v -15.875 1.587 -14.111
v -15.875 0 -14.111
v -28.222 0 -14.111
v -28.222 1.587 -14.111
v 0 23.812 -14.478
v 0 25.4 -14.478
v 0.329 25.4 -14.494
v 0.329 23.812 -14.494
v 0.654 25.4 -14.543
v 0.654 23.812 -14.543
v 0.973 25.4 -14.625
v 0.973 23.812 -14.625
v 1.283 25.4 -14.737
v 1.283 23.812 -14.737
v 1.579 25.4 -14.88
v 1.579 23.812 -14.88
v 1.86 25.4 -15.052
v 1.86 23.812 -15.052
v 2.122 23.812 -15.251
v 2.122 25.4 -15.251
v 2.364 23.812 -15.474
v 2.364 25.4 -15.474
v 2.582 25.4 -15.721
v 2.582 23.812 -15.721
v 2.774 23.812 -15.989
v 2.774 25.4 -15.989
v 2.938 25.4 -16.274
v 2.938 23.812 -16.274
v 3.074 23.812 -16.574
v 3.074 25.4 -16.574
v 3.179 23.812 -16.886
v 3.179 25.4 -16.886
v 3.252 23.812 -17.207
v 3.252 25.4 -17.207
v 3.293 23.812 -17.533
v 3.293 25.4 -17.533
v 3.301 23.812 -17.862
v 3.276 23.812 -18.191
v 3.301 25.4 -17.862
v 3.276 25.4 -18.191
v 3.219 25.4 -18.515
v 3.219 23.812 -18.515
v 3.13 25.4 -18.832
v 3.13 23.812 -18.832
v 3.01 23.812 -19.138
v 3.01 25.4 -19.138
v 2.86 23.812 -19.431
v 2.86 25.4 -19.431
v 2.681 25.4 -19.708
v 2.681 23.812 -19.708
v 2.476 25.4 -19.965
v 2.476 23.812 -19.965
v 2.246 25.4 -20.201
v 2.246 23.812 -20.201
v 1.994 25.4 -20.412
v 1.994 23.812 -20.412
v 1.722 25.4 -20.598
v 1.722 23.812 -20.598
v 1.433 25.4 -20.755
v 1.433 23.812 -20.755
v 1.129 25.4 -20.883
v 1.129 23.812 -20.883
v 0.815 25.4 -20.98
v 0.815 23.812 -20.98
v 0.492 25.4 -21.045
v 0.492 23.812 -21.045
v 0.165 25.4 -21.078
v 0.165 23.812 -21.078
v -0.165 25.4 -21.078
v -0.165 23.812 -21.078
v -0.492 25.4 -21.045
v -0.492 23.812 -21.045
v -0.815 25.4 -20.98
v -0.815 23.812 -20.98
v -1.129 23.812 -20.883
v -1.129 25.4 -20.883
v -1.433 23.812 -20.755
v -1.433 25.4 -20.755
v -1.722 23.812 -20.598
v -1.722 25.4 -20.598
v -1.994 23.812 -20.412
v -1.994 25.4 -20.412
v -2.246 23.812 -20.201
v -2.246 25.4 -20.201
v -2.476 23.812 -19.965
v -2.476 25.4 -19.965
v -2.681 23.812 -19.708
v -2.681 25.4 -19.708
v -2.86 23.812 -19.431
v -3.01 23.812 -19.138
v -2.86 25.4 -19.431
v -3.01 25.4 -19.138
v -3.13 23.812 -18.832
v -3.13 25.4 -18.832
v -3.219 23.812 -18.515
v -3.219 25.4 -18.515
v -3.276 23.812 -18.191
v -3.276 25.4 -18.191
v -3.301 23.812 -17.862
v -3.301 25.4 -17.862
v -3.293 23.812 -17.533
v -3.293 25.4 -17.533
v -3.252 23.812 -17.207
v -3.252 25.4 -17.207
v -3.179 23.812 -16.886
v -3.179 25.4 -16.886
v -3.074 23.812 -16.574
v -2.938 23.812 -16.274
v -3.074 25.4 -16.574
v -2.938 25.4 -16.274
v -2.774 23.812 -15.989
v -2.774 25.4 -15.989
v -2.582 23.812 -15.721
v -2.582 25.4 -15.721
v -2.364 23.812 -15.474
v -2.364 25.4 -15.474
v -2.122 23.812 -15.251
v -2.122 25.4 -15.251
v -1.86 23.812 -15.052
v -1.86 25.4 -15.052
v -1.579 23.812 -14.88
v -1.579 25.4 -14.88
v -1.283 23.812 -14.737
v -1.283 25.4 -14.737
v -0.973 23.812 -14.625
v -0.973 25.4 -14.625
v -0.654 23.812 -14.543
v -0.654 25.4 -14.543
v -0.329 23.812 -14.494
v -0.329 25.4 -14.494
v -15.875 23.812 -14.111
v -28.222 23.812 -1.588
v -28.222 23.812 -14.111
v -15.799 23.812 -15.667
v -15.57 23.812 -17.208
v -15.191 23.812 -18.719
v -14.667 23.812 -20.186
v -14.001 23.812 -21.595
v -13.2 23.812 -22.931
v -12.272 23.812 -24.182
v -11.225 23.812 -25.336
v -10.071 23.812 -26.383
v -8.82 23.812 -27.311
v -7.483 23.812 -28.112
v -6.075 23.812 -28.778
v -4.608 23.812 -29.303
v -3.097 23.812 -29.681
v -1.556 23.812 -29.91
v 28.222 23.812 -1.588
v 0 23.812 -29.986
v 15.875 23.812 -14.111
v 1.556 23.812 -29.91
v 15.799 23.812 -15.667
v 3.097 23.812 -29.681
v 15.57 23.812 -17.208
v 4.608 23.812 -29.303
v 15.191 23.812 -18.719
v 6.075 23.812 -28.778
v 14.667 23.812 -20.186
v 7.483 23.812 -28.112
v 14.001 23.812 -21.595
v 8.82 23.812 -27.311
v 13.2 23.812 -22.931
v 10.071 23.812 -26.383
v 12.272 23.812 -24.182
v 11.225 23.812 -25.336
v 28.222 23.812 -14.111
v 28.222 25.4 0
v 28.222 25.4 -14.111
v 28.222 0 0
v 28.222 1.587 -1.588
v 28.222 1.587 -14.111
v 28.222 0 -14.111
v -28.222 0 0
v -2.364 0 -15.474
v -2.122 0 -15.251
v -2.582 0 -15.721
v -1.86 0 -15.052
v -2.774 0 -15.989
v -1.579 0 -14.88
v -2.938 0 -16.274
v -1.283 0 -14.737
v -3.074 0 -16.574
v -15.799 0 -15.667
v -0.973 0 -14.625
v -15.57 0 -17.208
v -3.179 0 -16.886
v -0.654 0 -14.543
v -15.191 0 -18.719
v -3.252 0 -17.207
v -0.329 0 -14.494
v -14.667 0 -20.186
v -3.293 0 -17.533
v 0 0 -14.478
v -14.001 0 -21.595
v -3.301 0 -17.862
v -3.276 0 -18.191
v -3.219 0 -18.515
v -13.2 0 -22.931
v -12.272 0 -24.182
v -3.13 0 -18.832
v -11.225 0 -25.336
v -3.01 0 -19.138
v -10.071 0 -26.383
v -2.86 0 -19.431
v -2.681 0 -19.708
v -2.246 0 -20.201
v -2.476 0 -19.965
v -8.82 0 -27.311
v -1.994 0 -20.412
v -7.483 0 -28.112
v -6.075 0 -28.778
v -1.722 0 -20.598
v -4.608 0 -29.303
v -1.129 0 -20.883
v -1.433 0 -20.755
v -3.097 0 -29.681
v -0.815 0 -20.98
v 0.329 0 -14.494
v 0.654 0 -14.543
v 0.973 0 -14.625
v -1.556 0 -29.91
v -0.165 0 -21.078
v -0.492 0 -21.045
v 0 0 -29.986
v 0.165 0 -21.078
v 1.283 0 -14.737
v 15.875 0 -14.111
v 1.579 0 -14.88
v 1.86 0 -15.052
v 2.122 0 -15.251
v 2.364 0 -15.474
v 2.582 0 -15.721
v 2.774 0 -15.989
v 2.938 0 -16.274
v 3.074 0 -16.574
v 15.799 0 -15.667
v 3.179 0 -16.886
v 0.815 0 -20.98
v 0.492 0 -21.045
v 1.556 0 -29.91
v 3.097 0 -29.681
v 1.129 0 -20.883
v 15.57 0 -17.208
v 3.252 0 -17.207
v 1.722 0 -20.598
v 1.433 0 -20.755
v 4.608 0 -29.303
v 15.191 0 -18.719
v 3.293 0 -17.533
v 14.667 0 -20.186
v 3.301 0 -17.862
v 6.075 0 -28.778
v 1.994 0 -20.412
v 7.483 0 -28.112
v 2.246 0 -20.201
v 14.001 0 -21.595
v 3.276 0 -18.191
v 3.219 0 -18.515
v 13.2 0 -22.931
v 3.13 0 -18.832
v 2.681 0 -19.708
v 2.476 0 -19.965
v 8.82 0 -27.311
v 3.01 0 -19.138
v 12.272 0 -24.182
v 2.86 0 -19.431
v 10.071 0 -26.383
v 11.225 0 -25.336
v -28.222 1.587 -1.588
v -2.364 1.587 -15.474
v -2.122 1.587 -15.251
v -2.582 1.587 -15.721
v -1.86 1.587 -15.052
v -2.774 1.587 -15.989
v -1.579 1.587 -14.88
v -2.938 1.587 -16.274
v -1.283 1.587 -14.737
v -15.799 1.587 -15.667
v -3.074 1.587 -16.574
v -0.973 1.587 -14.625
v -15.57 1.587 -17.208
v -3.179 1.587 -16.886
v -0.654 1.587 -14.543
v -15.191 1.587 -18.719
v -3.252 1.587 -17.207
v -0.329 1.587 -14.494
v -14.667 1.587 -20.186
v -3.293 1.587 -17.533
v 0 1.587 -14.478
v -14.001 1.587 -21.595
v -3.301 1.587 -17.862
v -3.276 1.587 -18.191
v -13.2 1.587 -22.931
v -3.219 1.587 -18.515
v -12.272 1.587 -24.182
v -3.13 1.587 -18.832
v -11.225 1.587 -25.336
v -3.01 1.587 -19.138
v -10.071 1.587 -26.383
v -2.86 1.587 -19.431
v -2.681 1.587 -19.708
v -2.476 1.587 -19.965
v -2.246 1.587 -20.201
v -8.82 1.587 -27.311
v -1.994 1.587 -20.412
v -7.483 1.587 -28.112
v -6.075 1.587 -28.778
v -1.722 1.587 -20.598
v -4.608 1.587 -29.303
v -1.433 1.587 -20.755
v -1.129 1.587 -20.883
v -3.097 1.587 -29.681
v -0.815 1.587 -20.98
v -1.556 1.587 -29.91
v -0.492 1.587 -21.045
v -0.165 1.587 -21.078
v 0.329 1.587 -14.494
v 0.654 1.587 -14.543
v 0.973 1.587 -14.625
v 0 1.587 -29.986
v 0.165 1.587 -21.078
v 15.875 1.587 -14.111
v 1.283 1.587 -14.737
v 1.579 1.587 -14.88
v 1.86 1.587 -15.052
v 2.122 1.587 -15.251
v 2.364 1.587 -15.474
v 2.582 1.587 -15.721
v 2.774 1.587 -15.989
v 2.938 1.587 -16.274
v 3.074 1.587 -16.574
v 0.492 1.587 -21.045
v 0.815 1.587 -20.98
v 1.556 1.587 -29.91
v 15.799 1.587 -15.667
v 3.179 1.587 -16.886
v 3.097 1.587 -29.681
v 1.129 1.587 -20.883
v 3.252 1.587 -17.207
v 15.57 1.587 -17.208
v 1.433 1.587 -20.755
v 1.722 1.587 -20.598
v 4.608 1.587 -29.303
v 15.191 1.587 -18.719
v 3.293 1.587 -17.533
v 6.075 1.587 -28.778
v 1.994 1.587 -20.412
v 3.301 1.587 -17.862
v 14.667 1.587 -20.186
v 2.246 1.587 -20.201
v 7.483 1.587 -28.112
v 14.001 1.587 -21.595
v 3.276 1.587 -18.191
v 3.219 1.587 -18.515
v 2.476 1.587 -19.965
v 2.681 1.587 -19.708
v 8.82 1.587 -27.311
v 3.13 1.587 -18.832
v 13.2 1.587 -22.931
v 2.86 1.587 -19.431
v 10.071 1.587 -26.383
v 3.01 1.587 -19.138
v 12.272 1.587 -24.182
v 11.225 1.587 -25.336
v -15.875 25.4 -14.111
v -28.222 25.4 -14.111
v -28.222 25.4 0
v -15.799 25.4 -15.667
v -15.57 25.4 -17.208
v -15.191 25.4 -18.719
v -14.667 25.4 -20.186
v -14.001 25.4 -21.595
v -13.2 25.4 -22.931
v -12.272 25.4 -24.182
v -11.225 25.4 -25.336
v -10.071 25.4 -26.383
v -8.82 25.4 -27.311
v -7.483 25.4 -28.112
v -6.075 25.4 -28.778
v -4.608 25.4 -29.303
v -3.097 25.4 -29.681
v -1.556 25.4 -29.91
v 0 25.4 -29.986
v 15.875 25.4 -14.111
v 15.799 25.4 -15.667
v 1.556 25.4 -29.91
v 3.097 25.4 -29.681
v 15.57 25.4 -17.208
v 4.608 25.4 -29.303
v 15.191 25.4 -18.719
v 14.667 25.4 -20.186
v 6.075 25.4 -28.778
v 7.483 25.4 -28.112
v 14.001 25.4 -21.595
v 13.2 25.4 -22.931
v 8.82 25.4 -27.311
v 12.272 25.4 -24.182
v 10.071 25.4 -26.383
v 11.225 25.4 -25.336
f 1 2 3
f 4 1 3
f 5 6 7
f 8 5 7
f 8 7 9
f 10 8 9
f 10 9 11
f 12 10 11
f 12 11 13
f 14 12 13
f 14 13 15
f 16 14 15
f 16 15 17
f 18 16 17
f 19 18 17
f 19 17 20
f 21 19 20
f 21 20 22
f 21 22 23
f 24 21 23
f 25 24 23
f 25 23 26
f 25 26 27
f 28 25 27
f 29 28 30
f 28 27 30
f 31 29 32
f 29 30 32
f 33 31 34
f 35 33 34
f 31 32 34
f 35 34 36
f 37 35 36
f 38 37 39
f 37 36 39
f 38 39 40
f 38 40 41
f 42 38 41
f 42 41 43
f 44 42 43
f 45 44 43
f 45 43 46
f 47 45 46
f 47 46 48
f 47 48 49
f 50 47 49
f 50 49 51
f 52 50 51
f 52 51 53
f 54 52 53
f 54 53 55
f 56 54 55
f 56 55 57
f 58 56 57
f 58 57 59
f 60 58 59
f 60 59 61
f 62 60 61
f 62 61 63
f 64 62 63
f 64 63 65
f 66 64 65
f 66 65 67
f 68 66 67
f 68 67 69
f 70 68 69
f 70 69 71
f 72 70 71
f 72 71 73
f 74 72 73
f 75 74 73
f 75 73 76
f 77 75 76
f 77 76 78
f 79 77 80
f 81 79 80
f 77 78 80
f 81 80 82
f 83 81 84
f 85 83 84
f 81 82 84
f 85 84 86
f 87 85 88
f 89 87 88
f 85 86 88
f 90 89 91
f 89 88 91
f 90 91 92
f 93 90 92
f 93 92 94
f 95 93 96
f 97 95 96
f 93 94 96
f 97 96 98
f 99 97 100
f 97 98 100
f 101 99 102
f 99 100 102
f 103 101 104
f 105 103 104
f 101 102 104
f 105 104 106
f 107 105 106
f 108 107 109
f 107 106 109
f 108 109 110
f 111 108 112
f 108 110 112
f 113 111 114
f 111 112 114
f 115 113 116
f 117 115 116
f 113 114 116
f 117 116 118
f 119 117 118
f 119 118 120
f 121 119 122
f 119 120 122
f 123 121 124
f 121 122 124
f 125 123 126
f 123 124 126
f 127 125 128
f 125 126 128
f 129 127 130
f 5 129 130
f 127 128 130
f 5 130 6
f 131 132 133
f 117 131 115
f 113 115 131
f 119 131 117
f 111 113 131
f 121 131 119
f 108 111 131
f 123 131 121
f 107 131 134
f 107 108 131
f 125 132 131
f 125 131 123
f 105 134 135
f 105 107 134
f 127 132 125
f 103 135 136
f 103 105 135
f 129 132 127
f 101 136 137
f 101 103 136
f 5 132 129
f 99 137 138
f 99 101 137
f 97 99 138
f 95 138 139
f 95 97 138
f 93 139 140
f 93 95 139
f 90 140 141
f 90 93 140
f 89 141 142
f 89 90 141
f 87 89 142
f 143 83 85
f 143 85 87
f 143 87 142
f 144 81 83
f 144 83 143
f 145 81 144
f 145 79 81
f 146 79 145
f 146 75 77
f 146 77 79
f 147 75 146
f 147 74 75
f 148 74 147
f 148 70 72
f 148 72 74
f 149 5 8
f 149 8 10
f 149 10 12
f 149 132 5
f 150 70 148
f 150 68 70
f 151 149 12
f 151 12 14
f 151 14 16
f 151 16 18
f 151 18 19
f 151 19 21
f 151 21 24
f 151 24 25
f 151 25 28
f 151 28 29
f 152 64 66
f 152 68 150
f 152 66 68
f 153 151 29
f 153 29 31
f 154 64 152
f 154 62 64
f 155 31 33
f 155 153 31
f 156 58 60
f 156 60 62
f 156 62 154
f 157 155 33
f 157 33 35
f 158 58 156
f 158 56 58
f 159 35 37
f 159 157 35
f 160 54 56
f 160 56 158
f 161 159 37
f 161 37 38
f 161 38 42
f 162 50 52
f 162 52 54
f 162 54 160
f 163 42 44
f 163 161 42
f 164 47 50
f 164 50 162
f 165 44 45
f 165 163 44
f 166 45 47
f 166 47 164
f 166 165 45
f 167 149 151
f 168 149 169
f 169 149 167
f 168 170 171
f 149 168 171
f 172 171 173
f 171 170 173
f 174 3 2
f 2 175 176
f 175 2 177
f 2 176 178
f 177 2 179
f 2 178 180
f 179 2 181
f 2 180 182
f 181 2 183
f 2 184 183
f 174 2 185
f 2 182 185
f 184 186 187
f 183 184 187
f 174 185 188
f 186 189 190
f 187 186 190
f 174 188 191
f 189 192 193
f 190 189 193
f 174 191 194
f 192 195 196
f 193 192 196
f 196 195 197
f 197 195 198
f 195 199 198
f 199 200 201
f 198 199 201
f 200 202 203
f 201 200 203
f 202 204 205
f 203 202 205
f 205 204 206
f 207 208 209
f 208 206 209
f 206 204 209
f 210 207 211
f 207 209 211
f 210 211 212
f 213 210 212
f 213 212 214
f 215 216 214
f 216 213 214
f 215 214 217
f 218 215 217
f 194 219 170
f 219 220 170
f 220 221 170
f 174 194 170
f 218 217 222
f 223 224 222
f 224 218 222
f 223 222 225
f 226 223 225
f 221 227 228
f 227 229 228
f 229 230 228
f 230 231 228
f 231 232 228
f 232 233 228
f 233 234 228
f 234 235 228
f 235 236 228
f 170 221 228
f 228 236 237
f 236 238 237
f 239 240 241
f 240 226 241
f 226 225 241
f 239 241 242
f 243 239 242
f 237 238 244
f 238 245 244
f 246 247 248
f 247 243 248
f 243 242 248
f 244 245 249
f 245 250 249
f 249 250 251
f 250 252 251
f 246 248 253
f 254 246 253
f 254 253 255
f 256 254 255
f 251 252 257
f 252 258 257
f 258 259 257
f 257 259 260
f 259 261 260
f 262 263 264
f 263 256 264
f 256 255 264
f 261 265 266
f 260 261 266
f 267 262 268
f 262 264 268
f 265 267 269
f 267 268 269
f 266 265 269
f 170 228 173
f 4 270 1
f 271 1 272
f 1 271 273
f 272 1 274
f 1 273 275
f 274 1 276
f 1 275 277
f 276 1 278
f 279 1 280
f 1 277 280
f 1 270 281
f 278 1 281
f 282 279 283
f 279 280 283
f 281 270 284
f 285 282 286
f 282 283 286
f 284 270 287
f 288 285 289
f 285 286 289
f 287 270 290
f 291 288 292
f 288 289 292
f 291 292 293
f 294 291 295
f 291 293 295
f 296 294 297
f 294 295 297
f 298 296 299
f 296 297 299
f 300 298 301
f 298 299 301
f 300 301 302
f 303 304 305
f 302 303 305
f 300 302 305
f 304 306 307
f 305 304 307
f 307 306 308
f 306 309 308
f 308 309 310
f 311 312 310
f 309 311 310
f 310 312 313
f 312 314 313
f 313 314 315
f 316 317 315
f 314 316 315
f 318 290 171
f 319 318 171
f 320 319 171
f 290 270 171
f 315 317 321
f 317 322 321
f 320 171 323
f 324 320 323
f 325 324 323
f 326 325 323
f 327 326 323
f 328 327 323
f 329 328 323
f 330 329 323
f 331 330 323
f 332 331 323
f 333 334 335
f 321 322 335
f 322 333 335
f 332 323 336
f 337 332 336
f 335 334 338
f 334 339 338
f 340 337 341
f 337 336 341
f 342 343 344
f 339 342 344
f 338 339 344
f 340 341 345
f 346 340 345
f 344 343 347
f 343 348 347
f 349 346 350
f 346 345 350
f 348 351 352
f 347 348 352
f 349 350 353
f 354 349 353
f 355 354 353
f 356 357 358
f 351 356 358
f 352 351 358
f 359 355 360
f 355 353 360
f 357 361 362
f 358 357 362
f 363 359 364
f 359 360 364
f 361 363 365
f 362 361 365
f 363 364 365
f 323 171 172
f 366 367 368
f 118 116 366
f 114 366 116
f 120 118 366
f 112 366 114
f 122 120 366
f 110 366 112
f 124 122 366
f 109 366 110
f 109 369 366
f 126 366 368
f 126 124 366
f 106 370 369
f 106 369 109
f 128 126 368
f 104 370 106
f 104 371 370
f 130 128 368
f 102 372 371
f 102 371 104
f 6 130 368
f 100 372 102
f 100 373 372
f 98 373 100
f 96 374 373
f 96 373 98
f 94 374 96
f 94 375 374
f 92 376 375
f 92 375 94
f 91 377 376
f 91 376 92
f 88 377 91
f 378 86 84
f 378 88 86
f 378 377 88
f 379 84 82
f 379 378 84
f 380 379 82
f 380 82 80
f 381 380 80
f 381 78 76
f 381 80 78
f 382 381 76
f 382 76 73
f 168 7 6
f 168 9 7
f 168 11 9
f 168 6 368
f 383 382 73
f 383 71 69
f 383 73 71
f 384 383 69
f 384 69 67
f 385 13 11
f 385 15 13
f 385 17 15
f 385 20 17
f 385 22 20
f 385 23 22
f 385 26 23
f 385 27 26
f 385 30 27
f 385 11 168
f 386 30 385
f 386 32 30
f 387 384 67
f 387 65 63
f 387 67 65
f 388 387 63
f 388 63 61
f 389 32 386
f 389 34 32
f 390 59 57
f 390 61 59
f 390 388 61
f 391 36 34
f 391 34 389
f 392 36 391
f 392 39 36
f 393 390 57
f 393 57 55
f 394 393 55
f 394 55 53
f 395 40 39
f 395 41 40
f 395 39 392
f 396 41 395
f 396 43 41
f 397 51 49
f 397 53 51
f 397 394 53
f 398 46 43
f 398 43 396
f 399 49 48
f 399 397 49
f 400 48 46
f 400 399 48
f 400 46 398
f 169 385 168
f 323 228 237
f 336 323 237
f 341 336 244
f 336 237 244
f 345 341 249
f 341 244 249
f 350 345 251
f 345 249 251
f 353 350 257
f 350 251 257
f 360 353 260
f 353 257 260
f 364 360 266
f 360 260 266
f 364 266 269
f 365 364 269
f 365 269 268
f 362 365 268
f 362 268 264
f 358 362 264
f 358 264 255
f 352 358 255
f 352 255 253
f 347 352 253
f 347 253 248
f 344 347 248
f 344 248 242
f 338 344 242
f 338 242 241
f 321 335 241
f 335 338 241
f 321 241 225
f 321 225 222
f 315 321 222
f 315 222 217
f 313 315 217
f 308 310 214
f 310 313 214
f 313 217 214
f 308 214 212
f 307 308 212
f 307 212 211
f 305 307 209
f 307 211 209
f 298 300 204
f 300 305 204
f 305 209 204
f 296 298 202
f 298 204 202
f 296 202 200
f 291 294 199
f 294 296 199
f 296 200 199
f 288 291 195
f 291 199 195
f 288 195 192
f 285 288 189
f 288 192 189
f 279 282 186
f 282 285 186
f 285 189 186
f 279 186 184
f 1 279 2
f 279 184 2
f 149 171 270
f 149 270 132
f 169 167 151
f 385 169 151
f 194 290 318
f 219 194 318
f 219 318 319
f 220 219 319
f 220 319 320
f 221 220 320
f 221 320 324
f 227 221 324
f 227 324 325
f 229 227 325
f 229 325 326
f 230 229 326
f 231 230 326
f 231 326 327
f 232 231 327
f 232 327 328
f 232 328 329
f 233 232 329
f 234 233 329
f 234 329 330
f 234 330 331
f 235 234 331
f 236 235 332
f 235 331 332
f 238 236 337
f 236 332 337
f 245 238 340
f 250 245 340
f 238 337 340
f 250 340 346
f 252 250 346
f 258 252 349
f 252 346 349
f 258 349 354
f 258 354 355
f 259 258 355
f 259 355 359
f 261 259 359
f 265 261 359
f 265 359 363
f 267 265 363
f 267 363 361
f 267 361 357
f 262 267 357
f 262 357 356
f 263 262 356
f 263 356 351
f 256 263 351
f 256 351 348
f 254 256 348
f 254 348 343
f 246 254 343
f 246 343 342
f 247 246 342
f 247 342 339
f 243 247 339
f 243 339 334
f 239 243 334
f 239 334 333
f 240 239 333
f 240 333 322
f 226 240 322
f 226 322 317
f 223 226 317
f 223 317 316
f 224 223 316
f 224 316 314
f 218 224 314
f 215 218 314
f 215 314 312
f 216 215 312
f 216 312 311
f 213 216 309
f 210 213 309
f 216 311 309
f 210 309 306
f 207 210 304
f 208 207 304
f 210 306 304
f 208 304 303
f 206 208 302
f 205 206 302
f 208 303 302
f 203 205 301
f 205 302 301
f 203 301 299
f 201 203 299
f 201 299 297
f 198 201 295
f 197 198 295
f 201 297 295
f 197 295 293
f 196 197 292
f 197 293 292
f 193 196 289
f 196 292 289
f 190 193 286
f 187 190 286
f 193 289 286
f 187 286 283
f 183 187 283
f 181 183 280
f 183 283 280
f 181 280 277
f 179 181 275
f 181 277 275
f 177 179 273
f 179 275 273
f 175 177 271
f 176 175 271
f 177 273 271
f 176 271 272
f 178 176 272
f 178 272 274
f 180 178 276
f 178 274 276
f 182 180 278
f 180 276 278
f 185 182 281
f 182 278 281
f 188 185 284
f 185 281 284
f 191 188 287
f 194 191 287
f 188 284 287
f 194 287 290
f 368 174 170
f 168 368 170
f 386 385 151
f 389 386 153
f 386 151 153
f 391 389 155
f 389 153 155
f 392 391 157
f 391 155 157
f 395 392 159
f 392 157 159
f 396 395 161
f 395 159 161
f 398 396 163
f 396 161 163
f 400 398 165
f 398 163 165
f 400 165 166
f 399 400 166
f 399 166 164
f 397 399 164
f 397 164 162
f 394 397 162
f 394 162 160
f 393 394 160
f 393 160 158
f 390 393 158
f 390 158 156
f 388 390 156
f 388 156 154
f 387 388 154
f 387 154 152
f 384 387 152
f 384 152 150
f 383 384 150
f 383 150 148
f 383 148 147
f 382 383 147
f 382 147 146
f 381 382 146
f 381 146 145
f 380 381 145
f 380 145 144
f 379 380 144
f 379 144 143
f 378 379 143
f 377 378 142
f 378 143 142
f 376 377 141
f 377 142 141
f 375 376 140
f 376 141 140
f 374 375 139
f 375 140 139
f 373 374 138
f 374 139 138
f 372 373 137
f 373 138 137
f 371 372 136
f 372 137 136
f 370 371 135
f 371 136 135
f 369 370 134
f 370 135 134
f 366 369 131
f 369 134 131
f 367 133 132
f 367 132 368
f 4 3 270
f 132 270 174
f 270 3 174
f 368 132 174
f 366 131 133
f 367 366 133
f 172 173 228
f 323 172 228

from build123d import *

# Parameters (mm, degrees)
BOSS_EXTRUDE2_DEPTH = 25.4
SKETCH3_W           = 61.065778348
SKETCH3_H           = 22.225
CUT_EXTRUDE2_DEPTH  = 69.777192209
SKETCH4_R           = 3.302
CUT_EXTRUDE3_DEPTH  = 49.382028551


with BuildPart() as part:
    # Sketch1 → Boss-Extrude2 (new body)
    with BuildSketch(Plane(origin=(0, 0, 0), x_dir=(1, 0, 0), z_dir=(0, 1, 0))):
        with BuildLine():
            Line((0, 0), (28.222222222, 0))
            Line((28.222222222, 0), (28.222222222, 14.111111111))
            Line((28.222222222, 14.111111111), (15.875, 14.111111111))
            ThreePointArc((15.875, 14.111111111), (0, 29.986111111), (-15.875, 14.111111111))
            Line((-15.875, 14.111111111), (-28.222222222, 14.111111111))
            Line((-28.222222222, 14.111111111), (-28.222222222, 0))
            Line((-28.222222222, 0), (0, 0))
        make_face()
    extrude(amount=BOSS_EXTRUDE2_DEPTH)

    # Sketch3 → Cut-Extrude2 (cut, through all)
    with BuildSketch(Plane(origin=(28.222222222, 0, 0), x_dir=(0, 0, -1), z_dir=(1, 0, 0))):
        with Locations((32.120389174, 12.7)):
            Rectangle(SKETCH3_W, SKETCH3_H)
    extrude(amount=-CUT_EXTRUDE2_DEPTH, mode=Mode.SUBTRACT)

    # Sketch4 → Cut-Extrude3 (cut, through all)
    with BuildSketch(Plane(origin=(0, 25.4, 0), x_dir=(1, 0, 0), z_dir=(0, 1, 0))):
        with Locations(Location((0, 17.78, 0), (0, 0, 270))):
            Circle(SKETCH4_R)
    extrude(amount=-CUT_EXTRUDE3_DEPTH, mode=Mode.SUBTRACT)


solid = part.part
